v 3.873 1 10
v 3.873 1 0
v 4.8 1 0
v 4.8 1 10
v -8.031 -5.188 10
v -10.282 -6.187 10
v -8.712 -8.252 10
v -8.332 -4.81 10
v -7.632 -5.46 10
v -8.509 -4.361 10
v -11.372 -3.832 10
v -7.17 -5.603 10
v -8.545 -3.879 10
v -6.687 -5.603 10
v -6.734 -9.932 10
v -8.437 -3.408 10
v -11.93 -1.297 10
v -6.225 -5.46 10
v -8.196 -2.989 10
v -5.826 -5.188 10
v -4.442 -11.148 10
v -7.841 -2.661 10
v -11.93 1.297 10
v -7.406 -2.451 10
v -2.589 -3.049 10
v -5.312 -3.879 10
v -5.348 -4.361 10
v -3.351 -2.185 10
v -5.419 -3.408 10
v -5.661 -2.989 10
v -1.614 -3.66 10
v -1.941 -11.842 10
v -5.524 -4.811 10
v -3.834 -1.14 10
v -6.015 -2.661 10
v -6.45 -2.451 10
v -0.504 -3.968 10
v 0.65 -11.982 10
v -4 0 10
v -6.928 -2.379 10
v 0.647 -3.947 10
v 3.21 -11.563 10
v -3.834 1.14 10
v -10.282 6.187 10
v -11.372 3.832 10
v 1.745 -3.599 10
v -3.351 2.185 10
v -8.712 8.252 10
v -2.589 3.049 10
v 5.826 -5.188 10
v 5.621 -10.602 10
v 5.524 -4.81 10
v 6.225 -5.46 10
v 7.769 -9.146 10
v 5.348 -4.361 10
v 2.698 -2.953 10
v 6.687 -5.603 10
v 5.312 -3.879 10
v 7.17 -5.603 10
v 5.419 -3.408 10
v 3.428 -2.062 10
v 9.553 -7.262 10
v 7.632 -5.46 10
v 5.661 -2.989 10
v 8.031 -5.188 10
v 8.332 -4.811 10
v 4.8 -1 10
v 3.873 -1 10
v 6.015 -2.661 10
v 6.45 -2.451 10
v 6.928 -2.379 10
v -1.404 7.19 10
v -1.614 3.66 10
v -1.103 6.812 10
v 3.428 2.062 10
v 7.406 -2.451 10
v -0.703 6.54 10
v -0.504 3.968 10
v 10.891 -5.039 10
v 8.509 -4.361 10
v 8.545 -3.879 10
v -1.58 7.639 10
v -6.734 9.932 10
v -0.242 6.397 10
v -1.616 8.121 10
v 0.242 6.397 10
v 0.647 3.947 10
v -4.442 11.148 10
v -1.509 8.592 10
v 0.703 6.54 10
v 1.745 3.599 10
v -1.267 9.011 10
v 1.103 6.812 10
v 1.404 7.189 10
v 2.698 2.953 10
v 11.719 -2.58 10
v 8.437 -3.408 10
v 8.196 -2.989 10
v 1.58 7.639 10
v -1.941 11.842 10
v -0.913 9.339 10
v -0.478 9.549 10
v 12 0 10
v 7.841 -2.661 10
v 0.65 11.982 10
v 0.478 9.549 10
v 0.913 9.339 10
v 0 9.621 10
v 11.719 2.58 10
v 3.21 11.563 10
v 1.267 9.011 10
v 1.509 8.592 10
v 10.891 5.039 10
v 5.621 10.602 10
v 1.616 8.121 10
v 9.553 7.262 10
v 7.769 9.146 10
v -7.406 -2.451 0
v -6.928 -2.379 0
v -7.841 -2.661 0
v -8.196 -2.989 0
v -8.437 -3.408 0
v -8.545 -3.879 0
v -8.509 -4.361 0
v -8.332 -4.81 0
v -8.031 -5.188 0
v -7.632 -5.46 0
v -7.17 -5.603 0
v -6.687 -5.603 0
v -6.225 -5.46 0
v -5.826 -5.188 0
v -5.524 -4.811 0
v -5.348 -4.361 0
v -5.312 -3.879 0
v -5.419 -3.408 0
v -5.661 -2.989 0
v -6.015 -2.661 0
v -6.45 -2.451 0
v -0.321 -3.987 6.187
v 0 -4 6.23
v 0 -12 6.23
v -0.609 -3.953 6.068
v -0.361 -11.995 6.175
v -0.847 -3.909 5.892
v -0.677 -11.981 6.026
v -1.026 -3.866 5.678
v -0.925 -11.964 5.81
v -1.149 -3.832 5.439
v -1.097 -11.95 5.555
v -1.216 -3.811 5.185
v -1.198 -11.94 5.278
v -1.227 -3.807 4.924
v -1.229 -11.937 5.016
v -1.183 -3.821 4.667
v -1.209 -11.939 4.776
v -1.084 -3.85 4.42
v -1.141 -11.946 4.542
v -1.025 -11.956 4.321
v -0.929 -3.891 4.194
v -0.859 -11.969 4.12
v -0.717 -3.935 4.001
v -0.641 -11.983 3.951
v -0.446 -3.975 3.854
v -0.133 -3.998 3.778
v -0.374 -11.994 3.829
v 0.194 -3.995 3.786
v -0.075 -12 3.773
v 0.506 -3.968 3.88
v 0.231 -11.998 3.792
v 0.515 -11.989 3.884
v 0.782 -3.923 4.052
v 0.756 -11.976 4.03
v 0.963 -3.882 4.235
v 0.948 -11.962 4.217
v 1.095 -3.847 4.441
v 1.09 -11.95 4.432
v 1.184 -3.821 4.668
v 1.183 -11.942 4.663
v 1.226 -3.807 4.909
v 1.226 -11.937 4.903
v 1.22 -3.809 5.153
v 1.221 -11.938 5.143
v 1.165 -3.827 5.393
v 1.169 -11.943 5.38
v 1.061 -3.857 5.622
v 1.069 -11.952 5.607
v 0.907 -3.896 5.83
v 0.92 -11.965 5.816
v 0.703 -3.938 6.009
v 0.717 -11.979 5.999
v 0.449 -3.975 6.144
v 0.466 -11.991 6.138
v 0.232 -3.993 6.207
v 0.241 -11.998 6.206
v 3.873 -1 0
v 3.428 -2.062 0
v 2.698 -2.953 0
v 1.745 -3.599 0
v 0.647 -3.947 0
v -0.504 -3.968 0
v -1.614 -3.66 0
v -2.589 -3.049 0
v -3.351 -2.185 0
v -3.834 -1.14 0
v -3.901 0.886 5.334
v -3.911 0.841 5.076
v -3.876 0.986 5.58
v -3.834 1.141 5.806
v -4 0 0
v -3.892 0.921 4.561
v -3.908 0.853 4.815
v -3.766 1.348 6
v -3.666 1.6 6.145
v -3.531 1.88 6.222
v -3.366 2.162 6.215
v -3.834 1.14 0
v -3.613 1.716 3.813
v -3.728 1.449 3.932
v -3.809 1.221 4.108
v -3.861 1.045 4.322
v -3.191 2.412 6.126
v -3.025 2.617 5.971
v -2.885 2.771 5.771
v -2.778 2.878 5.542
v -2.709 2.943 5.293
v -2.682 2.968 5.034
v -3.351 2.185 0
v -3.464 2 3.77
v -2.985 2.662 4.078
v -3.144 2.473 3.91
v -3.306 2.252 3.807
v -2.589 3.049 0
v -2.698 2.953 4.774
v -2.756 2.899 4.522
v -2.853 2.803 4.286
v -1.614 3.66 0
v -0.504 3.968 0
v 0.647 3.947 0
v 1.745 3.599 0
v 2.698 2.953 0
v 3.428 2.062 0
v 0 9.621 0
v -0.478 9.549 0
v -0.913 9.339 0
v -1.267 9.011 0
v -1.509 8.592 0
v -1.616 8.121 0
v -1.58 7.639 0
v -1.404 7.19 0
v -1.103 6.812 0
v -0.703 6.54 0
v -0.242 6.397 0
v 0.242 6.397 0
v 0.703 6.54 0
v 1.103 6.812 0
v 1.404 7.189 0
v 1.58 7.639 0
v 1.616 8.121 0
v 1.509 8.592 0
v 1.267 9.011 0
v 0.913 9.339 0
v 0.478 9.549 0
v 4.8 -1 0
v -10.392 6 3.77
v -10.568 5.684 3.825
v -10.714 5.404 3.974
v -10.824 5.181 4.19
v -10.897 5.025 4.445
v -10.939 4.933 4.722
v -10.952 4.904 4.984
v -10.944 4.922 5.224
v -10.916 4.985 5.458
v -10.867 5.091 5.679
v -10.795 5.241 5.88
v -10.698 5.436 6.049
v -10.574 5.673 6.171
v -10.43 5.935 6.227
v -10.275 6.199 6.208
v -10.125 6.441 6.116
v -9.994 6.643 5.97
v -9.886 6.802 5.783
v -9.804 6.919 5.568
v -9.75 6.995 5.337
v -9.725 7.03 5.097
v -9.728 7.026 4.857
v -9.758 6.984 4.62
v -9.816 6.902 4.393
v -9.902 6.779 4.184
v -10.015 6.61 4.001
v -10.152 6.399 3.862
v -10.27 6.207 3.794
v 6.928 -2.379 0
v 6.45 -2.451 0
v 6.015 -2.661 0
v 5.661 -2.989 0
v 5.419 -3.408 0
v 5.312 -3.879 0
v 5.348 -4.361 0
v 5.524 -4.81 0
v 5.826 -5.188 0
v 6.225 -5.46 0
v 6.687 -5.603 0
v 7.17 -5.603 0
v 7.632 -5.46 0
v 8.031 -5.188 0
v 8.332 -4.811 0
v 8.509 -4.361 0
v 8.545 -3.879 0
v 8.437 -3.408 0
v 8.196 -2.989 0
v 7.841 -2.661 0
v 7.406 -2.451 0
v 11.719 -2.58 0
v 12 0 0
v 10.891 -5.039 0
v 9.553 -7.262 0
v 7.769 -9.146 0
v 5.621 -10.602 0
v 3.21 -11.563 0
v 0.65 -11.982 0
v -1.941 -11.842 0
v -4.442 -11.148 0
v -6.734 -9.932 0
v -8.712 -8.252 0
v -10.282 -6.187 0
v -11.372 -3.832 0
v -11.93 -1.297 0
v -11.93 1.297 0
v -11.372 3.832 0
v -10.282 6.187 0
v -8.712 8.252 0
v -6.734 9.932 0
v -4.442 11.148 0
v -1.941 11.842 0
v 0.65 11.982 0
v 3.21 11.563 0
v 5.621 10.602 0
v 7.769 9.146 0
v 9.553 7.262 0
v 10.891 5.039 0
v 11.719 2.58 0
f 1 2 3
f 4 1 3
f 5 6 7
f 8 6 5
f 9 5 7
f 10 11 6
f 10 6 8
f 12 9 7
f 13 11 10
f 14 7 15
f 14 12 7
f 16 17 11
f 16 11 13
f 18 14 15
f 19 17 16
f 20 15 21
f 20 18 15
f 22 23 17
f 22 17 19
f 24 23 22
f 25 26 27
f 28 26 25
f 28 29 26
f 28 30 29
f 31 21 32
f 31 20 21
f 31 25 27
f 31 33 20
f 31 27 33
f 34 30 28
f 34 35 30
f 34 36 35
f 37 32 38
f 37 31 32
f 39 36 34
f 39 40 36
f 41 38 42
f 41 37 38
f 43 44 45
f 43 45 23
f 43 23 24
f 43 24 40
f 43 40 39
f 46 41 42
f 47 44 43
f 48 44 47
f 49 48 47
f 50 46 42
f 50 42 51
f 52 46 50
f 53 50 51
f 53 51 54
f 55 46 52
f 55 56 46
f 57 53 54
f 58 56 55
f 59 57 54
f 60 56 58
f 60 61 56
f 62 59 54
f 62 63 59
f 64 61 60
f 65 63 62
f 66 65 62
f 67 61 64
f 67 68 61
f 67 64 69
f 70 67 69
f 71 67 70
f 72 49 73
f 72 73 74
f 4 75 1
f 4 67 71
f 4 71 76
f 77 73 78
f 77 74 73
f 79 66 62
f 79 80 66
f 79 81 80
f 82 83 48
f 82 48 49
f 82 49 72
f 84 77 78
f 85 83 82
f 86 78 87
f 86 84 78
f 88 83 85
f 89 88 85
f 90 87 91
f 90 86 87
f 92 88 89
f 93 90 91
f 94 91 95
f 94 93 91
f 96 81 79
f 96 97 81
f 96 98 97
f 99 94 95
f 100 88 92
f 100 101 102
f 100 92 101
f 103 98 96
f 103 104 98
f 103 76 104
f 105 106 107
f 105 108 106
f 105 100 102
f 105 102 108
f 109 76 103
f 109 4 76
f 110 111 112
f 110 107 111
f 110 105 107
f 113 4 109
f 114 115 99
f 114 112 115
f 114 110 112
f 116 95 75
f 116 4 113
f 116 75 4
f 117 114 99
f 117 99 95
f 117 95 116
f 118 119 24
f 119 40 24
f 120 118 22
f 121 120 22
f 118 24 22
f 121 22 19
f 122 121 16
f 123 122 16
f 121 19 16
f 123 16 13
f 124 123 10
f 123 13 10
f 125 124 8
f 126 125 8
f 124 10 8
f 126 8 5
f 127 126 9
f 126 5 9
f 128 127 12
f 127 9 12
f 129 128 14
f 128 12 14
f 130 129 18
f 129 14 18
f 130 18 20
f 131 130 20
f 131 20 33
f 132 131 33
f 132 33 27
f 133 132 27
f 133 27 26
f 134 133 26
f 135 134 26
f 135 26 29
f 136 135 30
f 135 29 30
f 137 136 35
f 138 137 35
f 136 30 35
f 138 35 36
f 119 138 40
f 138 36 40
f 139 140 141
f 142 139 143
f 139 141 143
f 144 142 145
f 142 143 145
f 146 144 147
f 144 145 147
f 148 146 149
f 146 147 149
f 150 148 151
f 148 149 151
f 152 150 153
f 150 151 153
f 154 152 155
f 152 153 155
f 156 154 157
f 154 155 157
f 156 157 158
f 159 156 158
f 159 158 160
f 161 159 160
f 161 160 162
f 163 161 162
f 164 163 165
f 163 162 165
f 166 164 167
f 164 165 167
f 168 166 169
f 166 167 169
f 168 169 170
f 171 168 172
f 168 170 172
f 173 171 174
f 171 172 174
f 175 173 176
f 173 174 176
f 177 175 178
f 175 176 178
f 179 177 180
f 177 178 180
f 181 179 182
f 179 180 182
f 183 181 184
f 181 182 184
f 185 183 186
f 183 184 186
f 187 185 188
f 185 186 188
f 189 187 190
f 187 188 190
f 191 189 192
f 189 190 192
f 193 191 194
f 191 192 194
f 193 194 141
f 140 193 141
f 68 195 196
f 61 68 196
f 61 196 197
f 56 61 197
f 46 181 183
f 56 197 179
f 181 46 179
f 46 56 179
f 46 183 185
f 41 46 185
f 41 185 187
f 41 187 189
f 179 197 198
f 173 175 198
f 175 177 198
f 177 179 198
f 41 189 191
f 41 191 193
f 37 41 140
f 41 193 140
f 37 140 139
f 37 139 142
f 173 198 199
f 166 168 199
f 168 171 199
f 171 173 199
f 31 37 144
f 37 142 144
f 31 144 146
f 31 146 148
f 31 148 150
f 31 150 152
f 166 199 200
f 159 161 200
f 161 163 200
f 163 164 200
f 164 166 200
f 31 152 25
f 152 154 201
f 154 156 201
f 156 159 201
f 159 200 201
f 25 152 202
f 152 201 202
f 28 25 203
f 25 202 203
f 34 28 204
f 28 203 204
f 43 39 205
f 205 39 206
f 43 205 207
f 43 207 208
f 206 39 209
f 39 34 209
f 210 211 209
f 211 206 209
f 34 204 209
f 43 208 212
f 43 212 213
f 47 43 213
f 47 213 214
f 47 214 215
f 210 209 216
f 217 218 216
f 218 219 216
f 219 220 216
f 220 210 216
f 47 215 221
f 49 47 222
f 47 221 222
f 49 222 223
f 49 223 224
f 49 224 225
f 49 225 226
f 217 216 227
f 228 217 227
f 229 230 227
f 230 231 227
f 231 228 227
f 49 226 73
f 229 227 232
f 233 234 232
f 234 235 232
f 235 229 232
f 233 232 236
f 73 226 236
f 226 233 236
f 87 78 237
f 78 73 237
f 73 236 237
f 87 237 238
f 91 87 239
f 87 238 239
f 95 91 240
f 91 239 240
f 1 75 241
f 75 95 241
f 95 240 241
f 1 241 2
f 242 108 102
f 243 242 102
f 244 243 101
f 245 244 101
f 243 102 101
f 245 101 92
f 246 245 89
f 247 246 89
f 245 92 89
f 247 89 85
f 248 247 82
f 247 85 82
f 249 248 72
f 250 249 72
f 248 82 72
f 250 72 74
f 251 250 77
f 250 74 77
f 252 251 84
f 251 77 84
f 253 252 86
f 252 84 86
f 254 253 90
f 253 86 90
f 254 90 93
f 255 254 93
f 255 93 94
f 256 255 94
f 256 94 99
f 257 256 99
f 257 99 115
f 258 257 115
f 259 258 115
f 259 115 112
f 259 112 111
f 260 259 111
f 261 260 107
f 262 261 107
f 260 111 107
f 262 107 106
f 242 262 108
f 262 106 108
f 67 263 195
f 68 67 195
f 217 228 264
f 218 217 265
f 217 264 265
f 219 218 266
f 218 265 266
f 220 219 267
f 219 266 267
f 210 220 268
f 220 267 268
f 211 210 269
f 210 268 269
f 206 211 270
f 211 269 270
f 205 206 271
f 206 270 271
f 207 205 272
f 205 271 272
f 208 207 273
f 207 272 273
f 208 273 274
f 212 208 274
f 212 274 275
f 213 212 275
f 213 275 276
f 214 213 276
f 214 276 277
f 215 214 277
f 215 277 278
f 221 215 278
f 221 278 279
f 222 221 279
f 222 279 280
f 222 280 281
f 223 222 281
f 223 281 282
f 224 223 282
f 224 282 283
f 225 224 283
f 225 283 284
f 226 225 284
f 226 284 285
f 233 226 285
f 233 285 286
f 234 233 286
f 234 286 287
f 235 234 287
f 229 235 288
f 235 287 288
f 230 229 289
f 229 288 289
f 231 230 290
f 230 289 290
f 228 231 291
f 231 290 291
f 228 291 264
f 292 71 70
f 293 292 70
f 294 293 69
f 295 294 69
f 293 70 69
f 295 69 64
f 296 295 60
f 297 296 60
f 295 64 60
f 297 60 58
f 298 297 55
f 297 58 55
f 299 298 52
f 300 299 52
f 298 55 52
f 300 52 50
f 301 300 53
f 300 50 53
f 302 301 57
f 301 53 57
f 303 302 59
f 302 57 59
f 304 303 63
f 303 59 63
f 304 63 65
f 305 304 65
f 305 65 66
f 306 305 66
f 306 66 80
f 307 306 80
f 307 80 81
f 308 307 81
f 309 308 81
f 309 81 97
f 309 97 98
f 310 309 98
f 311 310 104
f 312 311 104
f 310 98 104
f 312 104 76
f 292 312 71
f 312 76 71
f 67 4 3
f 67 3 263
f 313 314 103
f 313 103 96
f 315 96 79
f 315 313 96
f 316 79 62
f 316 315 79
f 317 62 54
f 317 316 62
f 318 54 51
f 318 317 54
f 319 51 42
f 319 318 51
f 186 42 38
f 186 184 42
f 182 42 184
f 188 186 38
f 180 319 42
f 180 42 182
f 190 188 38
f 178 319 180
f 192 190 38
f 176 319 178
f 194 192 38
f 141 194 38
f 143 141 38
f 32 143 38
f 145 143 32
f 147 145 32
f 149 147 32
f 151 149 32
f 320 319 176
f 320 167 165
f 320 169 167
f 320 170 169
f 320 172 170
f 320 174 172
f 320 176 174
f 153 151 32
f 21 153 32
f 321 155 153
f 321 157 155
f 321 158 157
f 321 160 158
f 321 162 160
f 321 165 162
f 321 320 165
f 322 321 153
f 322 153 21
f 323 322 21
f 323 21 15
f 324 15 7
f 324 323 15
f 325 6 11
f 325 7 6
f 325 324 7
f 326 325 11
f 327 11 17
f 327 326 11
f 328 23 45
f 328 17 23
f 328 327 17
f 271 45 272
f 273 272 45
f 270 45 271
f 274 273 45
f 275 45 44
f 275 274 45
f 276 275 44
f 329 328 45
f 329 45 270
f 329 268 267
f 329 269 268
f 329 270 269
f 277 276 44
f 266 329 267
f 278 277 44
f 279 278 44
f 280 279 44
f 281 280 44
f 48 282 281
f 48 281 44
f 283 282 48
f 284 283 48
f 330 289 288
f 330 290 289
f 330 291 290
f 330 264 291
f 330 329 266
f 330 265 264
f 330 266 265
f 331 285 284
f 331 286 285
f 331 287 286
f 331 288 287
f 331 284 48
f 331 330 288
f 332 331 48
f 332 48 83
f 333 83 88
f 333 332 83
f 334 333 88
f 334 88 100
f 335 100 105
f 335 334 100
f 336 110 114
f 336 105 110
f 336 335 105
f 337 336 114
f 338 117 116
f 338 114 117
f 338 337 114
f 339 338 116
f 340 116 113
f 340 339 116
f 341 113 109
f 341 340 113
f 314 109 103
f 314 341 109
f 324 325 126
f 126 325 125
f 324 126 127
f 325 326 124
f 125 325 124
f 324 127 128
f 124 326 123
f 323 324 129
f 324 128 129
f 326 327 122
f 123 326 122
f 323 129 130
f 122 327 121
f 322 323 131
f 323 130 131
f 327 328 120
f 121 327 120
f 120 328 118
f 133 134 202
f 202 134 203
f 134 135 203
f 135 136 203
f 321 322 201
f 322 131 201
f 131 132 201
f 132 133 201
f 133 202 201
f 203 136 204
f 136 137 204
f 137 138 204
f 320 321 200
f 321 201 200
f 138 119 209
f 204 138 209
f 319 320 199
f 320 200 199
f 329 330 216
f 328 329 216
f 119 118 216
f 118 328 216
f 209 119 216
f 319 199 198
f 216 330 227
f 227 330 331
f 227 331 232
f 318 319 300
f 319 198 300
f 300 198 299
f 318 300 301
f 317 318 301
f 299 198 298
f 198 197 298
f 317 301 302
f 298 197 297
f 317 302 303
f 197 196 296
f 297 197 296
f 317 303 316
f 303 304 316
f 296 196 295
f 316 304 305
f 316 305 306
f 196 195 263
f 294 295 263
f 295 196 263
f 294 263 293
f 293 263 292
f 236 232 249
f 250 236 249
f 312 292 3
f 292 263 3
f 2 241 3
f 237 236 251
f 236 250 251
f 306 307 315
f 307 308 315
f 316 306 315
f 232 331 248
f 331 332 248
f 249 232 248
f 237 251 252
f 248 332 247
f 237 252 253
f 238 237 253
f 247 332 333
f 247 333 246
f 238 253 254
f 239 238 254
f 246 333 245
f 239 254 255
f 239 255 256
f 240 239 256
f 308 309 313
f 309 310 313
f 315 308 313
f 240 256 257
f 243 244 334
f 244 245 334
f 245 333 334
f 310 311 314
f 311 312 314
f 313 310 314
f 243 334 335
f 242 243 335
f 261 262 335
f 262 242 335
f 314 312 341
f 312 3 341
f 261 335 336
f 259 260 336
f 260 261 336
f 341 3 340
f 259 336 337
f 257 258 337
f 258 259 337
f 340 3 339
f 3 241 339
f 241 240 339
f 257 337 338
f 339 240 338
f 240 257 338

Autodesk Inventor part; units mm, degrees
ref_plane "YZ Plane" through (0, 0, 0) normal (1, 0, 0) x (0, 1, 0)
ref_plane "XY Plane" through (0, 0, 0) normal (0, 0, 1) x (1, 0, 0)
sketch "Sketch1" plane through (0, 0, 0) normal (0, 0, 1) x (1, 0, 0)
  circle A0 centre (0, 0) radius 12
  circle A1 centre (0, 0) radius 4
  line L0 (3.873, 1) -> (4.8, 1)
  line L1 (4.8, 1) -> (4.8, -1)
  line L2 (4.8, -1) -> (3.873, -1)
  circle A2 centre (0, 8) radius 2
  circle A3 centre (-6.9282, -4) radius 2
  circle A4 centre (6.9282, -4) radius 2
  point P0 (4.8, 0)
  point P1 (-4, 0)
  dimension "d0" = 24
  dimension "d1" = 8
  dimension "d2" = 2
  dimension "d3" = 8.8
  dimension "d4" = 4
  dimension "d5" = 8
  dimension "d8" = 360
extrude "Extrusion1" add sketch "Sketch1" along normal blind 10 contours A0 | A2 | A3 | A4
ref_plane "Work Plane3" through (0, 0, 0) normal (0, 1, 0) x (0, 0, 1)
ref_plane "Work Plane2" through (0, 0, 0) normal (0.866, -0.5, 0) x (0, 0, 1)
sketch "Sketch2" plane through (0, 0, 0) normal (0, 1, 0) x (0, 0, 1)
  line L0 (10, -12) -> (10, 12) projected
  line L1 (0, -12) -> (0, 12) projected
  line L2 (0, 12) -> (10, 12) projected
  line L3 (0, -12) -> (10, -12) projected
  point P0 (0, 0)
  point P1 (5, 0)
  point P2 (5, -12)
  point P3 (10, 0)
hole "Hole1" at (0, 0, 5) direction (0, -1, 0) diameter 2.459 end through all thread size "M3x0.5" class "6H" standard "ISO Metric profile"
sketch "Sketch3" plane through (0, 0, 0) normal (0.866, -0.5, 0) x (0, 0, 1)
  line L0 (0, -12) -> (0, 12) projected
  line L1 (0, -3.266) -> (0, -1.534) projected
  line L2 (0, -2.8025) -> (0, -3.266) projected
  line L3 (0, -1.0705) -> (0, -2.8025) projected
  line L4 (0, -1.534) -> (0, -1.0705) projected
  line L5 (0, 12) -> (10, 12) projected
  line L6 (0, -12) -> (10, -12) projected
  point P0 (0, 0)
  point P1 (0, 2)
  point P2 (0, -2)
  point P3 (0, 8.9282)
  point P4 (0, 4.9282)
  point P5 (0, -4.9282)
  point P6 (0, -8.9282)
  point P7 (5, 0)
  point P8 (5, -12)
  point P9 (0, 0)
hole "Hole2" at (0, 0, 5) direction (-0.866, 0.5, 0) diameter 2.459 end through all thread size "M3x0.5" class "6H" standard "ISO Metric profile"
hole "Hole3" at (0, 8, 0) at (-6.9282, -4, 0) at (6.9282, -4, 0) direction (0, 0, 1) diameter 3.242 end through all thread size "M4x0.7" class "6H" standard "ISO Metric profile"
ref_plane "Work Plane1" through (0, 0, 0) normal (-0.5, -0.866, 0) x (0, 0, 1)
properties part number "spiebaan mount 10 mm" material "Aluminum 6061"
